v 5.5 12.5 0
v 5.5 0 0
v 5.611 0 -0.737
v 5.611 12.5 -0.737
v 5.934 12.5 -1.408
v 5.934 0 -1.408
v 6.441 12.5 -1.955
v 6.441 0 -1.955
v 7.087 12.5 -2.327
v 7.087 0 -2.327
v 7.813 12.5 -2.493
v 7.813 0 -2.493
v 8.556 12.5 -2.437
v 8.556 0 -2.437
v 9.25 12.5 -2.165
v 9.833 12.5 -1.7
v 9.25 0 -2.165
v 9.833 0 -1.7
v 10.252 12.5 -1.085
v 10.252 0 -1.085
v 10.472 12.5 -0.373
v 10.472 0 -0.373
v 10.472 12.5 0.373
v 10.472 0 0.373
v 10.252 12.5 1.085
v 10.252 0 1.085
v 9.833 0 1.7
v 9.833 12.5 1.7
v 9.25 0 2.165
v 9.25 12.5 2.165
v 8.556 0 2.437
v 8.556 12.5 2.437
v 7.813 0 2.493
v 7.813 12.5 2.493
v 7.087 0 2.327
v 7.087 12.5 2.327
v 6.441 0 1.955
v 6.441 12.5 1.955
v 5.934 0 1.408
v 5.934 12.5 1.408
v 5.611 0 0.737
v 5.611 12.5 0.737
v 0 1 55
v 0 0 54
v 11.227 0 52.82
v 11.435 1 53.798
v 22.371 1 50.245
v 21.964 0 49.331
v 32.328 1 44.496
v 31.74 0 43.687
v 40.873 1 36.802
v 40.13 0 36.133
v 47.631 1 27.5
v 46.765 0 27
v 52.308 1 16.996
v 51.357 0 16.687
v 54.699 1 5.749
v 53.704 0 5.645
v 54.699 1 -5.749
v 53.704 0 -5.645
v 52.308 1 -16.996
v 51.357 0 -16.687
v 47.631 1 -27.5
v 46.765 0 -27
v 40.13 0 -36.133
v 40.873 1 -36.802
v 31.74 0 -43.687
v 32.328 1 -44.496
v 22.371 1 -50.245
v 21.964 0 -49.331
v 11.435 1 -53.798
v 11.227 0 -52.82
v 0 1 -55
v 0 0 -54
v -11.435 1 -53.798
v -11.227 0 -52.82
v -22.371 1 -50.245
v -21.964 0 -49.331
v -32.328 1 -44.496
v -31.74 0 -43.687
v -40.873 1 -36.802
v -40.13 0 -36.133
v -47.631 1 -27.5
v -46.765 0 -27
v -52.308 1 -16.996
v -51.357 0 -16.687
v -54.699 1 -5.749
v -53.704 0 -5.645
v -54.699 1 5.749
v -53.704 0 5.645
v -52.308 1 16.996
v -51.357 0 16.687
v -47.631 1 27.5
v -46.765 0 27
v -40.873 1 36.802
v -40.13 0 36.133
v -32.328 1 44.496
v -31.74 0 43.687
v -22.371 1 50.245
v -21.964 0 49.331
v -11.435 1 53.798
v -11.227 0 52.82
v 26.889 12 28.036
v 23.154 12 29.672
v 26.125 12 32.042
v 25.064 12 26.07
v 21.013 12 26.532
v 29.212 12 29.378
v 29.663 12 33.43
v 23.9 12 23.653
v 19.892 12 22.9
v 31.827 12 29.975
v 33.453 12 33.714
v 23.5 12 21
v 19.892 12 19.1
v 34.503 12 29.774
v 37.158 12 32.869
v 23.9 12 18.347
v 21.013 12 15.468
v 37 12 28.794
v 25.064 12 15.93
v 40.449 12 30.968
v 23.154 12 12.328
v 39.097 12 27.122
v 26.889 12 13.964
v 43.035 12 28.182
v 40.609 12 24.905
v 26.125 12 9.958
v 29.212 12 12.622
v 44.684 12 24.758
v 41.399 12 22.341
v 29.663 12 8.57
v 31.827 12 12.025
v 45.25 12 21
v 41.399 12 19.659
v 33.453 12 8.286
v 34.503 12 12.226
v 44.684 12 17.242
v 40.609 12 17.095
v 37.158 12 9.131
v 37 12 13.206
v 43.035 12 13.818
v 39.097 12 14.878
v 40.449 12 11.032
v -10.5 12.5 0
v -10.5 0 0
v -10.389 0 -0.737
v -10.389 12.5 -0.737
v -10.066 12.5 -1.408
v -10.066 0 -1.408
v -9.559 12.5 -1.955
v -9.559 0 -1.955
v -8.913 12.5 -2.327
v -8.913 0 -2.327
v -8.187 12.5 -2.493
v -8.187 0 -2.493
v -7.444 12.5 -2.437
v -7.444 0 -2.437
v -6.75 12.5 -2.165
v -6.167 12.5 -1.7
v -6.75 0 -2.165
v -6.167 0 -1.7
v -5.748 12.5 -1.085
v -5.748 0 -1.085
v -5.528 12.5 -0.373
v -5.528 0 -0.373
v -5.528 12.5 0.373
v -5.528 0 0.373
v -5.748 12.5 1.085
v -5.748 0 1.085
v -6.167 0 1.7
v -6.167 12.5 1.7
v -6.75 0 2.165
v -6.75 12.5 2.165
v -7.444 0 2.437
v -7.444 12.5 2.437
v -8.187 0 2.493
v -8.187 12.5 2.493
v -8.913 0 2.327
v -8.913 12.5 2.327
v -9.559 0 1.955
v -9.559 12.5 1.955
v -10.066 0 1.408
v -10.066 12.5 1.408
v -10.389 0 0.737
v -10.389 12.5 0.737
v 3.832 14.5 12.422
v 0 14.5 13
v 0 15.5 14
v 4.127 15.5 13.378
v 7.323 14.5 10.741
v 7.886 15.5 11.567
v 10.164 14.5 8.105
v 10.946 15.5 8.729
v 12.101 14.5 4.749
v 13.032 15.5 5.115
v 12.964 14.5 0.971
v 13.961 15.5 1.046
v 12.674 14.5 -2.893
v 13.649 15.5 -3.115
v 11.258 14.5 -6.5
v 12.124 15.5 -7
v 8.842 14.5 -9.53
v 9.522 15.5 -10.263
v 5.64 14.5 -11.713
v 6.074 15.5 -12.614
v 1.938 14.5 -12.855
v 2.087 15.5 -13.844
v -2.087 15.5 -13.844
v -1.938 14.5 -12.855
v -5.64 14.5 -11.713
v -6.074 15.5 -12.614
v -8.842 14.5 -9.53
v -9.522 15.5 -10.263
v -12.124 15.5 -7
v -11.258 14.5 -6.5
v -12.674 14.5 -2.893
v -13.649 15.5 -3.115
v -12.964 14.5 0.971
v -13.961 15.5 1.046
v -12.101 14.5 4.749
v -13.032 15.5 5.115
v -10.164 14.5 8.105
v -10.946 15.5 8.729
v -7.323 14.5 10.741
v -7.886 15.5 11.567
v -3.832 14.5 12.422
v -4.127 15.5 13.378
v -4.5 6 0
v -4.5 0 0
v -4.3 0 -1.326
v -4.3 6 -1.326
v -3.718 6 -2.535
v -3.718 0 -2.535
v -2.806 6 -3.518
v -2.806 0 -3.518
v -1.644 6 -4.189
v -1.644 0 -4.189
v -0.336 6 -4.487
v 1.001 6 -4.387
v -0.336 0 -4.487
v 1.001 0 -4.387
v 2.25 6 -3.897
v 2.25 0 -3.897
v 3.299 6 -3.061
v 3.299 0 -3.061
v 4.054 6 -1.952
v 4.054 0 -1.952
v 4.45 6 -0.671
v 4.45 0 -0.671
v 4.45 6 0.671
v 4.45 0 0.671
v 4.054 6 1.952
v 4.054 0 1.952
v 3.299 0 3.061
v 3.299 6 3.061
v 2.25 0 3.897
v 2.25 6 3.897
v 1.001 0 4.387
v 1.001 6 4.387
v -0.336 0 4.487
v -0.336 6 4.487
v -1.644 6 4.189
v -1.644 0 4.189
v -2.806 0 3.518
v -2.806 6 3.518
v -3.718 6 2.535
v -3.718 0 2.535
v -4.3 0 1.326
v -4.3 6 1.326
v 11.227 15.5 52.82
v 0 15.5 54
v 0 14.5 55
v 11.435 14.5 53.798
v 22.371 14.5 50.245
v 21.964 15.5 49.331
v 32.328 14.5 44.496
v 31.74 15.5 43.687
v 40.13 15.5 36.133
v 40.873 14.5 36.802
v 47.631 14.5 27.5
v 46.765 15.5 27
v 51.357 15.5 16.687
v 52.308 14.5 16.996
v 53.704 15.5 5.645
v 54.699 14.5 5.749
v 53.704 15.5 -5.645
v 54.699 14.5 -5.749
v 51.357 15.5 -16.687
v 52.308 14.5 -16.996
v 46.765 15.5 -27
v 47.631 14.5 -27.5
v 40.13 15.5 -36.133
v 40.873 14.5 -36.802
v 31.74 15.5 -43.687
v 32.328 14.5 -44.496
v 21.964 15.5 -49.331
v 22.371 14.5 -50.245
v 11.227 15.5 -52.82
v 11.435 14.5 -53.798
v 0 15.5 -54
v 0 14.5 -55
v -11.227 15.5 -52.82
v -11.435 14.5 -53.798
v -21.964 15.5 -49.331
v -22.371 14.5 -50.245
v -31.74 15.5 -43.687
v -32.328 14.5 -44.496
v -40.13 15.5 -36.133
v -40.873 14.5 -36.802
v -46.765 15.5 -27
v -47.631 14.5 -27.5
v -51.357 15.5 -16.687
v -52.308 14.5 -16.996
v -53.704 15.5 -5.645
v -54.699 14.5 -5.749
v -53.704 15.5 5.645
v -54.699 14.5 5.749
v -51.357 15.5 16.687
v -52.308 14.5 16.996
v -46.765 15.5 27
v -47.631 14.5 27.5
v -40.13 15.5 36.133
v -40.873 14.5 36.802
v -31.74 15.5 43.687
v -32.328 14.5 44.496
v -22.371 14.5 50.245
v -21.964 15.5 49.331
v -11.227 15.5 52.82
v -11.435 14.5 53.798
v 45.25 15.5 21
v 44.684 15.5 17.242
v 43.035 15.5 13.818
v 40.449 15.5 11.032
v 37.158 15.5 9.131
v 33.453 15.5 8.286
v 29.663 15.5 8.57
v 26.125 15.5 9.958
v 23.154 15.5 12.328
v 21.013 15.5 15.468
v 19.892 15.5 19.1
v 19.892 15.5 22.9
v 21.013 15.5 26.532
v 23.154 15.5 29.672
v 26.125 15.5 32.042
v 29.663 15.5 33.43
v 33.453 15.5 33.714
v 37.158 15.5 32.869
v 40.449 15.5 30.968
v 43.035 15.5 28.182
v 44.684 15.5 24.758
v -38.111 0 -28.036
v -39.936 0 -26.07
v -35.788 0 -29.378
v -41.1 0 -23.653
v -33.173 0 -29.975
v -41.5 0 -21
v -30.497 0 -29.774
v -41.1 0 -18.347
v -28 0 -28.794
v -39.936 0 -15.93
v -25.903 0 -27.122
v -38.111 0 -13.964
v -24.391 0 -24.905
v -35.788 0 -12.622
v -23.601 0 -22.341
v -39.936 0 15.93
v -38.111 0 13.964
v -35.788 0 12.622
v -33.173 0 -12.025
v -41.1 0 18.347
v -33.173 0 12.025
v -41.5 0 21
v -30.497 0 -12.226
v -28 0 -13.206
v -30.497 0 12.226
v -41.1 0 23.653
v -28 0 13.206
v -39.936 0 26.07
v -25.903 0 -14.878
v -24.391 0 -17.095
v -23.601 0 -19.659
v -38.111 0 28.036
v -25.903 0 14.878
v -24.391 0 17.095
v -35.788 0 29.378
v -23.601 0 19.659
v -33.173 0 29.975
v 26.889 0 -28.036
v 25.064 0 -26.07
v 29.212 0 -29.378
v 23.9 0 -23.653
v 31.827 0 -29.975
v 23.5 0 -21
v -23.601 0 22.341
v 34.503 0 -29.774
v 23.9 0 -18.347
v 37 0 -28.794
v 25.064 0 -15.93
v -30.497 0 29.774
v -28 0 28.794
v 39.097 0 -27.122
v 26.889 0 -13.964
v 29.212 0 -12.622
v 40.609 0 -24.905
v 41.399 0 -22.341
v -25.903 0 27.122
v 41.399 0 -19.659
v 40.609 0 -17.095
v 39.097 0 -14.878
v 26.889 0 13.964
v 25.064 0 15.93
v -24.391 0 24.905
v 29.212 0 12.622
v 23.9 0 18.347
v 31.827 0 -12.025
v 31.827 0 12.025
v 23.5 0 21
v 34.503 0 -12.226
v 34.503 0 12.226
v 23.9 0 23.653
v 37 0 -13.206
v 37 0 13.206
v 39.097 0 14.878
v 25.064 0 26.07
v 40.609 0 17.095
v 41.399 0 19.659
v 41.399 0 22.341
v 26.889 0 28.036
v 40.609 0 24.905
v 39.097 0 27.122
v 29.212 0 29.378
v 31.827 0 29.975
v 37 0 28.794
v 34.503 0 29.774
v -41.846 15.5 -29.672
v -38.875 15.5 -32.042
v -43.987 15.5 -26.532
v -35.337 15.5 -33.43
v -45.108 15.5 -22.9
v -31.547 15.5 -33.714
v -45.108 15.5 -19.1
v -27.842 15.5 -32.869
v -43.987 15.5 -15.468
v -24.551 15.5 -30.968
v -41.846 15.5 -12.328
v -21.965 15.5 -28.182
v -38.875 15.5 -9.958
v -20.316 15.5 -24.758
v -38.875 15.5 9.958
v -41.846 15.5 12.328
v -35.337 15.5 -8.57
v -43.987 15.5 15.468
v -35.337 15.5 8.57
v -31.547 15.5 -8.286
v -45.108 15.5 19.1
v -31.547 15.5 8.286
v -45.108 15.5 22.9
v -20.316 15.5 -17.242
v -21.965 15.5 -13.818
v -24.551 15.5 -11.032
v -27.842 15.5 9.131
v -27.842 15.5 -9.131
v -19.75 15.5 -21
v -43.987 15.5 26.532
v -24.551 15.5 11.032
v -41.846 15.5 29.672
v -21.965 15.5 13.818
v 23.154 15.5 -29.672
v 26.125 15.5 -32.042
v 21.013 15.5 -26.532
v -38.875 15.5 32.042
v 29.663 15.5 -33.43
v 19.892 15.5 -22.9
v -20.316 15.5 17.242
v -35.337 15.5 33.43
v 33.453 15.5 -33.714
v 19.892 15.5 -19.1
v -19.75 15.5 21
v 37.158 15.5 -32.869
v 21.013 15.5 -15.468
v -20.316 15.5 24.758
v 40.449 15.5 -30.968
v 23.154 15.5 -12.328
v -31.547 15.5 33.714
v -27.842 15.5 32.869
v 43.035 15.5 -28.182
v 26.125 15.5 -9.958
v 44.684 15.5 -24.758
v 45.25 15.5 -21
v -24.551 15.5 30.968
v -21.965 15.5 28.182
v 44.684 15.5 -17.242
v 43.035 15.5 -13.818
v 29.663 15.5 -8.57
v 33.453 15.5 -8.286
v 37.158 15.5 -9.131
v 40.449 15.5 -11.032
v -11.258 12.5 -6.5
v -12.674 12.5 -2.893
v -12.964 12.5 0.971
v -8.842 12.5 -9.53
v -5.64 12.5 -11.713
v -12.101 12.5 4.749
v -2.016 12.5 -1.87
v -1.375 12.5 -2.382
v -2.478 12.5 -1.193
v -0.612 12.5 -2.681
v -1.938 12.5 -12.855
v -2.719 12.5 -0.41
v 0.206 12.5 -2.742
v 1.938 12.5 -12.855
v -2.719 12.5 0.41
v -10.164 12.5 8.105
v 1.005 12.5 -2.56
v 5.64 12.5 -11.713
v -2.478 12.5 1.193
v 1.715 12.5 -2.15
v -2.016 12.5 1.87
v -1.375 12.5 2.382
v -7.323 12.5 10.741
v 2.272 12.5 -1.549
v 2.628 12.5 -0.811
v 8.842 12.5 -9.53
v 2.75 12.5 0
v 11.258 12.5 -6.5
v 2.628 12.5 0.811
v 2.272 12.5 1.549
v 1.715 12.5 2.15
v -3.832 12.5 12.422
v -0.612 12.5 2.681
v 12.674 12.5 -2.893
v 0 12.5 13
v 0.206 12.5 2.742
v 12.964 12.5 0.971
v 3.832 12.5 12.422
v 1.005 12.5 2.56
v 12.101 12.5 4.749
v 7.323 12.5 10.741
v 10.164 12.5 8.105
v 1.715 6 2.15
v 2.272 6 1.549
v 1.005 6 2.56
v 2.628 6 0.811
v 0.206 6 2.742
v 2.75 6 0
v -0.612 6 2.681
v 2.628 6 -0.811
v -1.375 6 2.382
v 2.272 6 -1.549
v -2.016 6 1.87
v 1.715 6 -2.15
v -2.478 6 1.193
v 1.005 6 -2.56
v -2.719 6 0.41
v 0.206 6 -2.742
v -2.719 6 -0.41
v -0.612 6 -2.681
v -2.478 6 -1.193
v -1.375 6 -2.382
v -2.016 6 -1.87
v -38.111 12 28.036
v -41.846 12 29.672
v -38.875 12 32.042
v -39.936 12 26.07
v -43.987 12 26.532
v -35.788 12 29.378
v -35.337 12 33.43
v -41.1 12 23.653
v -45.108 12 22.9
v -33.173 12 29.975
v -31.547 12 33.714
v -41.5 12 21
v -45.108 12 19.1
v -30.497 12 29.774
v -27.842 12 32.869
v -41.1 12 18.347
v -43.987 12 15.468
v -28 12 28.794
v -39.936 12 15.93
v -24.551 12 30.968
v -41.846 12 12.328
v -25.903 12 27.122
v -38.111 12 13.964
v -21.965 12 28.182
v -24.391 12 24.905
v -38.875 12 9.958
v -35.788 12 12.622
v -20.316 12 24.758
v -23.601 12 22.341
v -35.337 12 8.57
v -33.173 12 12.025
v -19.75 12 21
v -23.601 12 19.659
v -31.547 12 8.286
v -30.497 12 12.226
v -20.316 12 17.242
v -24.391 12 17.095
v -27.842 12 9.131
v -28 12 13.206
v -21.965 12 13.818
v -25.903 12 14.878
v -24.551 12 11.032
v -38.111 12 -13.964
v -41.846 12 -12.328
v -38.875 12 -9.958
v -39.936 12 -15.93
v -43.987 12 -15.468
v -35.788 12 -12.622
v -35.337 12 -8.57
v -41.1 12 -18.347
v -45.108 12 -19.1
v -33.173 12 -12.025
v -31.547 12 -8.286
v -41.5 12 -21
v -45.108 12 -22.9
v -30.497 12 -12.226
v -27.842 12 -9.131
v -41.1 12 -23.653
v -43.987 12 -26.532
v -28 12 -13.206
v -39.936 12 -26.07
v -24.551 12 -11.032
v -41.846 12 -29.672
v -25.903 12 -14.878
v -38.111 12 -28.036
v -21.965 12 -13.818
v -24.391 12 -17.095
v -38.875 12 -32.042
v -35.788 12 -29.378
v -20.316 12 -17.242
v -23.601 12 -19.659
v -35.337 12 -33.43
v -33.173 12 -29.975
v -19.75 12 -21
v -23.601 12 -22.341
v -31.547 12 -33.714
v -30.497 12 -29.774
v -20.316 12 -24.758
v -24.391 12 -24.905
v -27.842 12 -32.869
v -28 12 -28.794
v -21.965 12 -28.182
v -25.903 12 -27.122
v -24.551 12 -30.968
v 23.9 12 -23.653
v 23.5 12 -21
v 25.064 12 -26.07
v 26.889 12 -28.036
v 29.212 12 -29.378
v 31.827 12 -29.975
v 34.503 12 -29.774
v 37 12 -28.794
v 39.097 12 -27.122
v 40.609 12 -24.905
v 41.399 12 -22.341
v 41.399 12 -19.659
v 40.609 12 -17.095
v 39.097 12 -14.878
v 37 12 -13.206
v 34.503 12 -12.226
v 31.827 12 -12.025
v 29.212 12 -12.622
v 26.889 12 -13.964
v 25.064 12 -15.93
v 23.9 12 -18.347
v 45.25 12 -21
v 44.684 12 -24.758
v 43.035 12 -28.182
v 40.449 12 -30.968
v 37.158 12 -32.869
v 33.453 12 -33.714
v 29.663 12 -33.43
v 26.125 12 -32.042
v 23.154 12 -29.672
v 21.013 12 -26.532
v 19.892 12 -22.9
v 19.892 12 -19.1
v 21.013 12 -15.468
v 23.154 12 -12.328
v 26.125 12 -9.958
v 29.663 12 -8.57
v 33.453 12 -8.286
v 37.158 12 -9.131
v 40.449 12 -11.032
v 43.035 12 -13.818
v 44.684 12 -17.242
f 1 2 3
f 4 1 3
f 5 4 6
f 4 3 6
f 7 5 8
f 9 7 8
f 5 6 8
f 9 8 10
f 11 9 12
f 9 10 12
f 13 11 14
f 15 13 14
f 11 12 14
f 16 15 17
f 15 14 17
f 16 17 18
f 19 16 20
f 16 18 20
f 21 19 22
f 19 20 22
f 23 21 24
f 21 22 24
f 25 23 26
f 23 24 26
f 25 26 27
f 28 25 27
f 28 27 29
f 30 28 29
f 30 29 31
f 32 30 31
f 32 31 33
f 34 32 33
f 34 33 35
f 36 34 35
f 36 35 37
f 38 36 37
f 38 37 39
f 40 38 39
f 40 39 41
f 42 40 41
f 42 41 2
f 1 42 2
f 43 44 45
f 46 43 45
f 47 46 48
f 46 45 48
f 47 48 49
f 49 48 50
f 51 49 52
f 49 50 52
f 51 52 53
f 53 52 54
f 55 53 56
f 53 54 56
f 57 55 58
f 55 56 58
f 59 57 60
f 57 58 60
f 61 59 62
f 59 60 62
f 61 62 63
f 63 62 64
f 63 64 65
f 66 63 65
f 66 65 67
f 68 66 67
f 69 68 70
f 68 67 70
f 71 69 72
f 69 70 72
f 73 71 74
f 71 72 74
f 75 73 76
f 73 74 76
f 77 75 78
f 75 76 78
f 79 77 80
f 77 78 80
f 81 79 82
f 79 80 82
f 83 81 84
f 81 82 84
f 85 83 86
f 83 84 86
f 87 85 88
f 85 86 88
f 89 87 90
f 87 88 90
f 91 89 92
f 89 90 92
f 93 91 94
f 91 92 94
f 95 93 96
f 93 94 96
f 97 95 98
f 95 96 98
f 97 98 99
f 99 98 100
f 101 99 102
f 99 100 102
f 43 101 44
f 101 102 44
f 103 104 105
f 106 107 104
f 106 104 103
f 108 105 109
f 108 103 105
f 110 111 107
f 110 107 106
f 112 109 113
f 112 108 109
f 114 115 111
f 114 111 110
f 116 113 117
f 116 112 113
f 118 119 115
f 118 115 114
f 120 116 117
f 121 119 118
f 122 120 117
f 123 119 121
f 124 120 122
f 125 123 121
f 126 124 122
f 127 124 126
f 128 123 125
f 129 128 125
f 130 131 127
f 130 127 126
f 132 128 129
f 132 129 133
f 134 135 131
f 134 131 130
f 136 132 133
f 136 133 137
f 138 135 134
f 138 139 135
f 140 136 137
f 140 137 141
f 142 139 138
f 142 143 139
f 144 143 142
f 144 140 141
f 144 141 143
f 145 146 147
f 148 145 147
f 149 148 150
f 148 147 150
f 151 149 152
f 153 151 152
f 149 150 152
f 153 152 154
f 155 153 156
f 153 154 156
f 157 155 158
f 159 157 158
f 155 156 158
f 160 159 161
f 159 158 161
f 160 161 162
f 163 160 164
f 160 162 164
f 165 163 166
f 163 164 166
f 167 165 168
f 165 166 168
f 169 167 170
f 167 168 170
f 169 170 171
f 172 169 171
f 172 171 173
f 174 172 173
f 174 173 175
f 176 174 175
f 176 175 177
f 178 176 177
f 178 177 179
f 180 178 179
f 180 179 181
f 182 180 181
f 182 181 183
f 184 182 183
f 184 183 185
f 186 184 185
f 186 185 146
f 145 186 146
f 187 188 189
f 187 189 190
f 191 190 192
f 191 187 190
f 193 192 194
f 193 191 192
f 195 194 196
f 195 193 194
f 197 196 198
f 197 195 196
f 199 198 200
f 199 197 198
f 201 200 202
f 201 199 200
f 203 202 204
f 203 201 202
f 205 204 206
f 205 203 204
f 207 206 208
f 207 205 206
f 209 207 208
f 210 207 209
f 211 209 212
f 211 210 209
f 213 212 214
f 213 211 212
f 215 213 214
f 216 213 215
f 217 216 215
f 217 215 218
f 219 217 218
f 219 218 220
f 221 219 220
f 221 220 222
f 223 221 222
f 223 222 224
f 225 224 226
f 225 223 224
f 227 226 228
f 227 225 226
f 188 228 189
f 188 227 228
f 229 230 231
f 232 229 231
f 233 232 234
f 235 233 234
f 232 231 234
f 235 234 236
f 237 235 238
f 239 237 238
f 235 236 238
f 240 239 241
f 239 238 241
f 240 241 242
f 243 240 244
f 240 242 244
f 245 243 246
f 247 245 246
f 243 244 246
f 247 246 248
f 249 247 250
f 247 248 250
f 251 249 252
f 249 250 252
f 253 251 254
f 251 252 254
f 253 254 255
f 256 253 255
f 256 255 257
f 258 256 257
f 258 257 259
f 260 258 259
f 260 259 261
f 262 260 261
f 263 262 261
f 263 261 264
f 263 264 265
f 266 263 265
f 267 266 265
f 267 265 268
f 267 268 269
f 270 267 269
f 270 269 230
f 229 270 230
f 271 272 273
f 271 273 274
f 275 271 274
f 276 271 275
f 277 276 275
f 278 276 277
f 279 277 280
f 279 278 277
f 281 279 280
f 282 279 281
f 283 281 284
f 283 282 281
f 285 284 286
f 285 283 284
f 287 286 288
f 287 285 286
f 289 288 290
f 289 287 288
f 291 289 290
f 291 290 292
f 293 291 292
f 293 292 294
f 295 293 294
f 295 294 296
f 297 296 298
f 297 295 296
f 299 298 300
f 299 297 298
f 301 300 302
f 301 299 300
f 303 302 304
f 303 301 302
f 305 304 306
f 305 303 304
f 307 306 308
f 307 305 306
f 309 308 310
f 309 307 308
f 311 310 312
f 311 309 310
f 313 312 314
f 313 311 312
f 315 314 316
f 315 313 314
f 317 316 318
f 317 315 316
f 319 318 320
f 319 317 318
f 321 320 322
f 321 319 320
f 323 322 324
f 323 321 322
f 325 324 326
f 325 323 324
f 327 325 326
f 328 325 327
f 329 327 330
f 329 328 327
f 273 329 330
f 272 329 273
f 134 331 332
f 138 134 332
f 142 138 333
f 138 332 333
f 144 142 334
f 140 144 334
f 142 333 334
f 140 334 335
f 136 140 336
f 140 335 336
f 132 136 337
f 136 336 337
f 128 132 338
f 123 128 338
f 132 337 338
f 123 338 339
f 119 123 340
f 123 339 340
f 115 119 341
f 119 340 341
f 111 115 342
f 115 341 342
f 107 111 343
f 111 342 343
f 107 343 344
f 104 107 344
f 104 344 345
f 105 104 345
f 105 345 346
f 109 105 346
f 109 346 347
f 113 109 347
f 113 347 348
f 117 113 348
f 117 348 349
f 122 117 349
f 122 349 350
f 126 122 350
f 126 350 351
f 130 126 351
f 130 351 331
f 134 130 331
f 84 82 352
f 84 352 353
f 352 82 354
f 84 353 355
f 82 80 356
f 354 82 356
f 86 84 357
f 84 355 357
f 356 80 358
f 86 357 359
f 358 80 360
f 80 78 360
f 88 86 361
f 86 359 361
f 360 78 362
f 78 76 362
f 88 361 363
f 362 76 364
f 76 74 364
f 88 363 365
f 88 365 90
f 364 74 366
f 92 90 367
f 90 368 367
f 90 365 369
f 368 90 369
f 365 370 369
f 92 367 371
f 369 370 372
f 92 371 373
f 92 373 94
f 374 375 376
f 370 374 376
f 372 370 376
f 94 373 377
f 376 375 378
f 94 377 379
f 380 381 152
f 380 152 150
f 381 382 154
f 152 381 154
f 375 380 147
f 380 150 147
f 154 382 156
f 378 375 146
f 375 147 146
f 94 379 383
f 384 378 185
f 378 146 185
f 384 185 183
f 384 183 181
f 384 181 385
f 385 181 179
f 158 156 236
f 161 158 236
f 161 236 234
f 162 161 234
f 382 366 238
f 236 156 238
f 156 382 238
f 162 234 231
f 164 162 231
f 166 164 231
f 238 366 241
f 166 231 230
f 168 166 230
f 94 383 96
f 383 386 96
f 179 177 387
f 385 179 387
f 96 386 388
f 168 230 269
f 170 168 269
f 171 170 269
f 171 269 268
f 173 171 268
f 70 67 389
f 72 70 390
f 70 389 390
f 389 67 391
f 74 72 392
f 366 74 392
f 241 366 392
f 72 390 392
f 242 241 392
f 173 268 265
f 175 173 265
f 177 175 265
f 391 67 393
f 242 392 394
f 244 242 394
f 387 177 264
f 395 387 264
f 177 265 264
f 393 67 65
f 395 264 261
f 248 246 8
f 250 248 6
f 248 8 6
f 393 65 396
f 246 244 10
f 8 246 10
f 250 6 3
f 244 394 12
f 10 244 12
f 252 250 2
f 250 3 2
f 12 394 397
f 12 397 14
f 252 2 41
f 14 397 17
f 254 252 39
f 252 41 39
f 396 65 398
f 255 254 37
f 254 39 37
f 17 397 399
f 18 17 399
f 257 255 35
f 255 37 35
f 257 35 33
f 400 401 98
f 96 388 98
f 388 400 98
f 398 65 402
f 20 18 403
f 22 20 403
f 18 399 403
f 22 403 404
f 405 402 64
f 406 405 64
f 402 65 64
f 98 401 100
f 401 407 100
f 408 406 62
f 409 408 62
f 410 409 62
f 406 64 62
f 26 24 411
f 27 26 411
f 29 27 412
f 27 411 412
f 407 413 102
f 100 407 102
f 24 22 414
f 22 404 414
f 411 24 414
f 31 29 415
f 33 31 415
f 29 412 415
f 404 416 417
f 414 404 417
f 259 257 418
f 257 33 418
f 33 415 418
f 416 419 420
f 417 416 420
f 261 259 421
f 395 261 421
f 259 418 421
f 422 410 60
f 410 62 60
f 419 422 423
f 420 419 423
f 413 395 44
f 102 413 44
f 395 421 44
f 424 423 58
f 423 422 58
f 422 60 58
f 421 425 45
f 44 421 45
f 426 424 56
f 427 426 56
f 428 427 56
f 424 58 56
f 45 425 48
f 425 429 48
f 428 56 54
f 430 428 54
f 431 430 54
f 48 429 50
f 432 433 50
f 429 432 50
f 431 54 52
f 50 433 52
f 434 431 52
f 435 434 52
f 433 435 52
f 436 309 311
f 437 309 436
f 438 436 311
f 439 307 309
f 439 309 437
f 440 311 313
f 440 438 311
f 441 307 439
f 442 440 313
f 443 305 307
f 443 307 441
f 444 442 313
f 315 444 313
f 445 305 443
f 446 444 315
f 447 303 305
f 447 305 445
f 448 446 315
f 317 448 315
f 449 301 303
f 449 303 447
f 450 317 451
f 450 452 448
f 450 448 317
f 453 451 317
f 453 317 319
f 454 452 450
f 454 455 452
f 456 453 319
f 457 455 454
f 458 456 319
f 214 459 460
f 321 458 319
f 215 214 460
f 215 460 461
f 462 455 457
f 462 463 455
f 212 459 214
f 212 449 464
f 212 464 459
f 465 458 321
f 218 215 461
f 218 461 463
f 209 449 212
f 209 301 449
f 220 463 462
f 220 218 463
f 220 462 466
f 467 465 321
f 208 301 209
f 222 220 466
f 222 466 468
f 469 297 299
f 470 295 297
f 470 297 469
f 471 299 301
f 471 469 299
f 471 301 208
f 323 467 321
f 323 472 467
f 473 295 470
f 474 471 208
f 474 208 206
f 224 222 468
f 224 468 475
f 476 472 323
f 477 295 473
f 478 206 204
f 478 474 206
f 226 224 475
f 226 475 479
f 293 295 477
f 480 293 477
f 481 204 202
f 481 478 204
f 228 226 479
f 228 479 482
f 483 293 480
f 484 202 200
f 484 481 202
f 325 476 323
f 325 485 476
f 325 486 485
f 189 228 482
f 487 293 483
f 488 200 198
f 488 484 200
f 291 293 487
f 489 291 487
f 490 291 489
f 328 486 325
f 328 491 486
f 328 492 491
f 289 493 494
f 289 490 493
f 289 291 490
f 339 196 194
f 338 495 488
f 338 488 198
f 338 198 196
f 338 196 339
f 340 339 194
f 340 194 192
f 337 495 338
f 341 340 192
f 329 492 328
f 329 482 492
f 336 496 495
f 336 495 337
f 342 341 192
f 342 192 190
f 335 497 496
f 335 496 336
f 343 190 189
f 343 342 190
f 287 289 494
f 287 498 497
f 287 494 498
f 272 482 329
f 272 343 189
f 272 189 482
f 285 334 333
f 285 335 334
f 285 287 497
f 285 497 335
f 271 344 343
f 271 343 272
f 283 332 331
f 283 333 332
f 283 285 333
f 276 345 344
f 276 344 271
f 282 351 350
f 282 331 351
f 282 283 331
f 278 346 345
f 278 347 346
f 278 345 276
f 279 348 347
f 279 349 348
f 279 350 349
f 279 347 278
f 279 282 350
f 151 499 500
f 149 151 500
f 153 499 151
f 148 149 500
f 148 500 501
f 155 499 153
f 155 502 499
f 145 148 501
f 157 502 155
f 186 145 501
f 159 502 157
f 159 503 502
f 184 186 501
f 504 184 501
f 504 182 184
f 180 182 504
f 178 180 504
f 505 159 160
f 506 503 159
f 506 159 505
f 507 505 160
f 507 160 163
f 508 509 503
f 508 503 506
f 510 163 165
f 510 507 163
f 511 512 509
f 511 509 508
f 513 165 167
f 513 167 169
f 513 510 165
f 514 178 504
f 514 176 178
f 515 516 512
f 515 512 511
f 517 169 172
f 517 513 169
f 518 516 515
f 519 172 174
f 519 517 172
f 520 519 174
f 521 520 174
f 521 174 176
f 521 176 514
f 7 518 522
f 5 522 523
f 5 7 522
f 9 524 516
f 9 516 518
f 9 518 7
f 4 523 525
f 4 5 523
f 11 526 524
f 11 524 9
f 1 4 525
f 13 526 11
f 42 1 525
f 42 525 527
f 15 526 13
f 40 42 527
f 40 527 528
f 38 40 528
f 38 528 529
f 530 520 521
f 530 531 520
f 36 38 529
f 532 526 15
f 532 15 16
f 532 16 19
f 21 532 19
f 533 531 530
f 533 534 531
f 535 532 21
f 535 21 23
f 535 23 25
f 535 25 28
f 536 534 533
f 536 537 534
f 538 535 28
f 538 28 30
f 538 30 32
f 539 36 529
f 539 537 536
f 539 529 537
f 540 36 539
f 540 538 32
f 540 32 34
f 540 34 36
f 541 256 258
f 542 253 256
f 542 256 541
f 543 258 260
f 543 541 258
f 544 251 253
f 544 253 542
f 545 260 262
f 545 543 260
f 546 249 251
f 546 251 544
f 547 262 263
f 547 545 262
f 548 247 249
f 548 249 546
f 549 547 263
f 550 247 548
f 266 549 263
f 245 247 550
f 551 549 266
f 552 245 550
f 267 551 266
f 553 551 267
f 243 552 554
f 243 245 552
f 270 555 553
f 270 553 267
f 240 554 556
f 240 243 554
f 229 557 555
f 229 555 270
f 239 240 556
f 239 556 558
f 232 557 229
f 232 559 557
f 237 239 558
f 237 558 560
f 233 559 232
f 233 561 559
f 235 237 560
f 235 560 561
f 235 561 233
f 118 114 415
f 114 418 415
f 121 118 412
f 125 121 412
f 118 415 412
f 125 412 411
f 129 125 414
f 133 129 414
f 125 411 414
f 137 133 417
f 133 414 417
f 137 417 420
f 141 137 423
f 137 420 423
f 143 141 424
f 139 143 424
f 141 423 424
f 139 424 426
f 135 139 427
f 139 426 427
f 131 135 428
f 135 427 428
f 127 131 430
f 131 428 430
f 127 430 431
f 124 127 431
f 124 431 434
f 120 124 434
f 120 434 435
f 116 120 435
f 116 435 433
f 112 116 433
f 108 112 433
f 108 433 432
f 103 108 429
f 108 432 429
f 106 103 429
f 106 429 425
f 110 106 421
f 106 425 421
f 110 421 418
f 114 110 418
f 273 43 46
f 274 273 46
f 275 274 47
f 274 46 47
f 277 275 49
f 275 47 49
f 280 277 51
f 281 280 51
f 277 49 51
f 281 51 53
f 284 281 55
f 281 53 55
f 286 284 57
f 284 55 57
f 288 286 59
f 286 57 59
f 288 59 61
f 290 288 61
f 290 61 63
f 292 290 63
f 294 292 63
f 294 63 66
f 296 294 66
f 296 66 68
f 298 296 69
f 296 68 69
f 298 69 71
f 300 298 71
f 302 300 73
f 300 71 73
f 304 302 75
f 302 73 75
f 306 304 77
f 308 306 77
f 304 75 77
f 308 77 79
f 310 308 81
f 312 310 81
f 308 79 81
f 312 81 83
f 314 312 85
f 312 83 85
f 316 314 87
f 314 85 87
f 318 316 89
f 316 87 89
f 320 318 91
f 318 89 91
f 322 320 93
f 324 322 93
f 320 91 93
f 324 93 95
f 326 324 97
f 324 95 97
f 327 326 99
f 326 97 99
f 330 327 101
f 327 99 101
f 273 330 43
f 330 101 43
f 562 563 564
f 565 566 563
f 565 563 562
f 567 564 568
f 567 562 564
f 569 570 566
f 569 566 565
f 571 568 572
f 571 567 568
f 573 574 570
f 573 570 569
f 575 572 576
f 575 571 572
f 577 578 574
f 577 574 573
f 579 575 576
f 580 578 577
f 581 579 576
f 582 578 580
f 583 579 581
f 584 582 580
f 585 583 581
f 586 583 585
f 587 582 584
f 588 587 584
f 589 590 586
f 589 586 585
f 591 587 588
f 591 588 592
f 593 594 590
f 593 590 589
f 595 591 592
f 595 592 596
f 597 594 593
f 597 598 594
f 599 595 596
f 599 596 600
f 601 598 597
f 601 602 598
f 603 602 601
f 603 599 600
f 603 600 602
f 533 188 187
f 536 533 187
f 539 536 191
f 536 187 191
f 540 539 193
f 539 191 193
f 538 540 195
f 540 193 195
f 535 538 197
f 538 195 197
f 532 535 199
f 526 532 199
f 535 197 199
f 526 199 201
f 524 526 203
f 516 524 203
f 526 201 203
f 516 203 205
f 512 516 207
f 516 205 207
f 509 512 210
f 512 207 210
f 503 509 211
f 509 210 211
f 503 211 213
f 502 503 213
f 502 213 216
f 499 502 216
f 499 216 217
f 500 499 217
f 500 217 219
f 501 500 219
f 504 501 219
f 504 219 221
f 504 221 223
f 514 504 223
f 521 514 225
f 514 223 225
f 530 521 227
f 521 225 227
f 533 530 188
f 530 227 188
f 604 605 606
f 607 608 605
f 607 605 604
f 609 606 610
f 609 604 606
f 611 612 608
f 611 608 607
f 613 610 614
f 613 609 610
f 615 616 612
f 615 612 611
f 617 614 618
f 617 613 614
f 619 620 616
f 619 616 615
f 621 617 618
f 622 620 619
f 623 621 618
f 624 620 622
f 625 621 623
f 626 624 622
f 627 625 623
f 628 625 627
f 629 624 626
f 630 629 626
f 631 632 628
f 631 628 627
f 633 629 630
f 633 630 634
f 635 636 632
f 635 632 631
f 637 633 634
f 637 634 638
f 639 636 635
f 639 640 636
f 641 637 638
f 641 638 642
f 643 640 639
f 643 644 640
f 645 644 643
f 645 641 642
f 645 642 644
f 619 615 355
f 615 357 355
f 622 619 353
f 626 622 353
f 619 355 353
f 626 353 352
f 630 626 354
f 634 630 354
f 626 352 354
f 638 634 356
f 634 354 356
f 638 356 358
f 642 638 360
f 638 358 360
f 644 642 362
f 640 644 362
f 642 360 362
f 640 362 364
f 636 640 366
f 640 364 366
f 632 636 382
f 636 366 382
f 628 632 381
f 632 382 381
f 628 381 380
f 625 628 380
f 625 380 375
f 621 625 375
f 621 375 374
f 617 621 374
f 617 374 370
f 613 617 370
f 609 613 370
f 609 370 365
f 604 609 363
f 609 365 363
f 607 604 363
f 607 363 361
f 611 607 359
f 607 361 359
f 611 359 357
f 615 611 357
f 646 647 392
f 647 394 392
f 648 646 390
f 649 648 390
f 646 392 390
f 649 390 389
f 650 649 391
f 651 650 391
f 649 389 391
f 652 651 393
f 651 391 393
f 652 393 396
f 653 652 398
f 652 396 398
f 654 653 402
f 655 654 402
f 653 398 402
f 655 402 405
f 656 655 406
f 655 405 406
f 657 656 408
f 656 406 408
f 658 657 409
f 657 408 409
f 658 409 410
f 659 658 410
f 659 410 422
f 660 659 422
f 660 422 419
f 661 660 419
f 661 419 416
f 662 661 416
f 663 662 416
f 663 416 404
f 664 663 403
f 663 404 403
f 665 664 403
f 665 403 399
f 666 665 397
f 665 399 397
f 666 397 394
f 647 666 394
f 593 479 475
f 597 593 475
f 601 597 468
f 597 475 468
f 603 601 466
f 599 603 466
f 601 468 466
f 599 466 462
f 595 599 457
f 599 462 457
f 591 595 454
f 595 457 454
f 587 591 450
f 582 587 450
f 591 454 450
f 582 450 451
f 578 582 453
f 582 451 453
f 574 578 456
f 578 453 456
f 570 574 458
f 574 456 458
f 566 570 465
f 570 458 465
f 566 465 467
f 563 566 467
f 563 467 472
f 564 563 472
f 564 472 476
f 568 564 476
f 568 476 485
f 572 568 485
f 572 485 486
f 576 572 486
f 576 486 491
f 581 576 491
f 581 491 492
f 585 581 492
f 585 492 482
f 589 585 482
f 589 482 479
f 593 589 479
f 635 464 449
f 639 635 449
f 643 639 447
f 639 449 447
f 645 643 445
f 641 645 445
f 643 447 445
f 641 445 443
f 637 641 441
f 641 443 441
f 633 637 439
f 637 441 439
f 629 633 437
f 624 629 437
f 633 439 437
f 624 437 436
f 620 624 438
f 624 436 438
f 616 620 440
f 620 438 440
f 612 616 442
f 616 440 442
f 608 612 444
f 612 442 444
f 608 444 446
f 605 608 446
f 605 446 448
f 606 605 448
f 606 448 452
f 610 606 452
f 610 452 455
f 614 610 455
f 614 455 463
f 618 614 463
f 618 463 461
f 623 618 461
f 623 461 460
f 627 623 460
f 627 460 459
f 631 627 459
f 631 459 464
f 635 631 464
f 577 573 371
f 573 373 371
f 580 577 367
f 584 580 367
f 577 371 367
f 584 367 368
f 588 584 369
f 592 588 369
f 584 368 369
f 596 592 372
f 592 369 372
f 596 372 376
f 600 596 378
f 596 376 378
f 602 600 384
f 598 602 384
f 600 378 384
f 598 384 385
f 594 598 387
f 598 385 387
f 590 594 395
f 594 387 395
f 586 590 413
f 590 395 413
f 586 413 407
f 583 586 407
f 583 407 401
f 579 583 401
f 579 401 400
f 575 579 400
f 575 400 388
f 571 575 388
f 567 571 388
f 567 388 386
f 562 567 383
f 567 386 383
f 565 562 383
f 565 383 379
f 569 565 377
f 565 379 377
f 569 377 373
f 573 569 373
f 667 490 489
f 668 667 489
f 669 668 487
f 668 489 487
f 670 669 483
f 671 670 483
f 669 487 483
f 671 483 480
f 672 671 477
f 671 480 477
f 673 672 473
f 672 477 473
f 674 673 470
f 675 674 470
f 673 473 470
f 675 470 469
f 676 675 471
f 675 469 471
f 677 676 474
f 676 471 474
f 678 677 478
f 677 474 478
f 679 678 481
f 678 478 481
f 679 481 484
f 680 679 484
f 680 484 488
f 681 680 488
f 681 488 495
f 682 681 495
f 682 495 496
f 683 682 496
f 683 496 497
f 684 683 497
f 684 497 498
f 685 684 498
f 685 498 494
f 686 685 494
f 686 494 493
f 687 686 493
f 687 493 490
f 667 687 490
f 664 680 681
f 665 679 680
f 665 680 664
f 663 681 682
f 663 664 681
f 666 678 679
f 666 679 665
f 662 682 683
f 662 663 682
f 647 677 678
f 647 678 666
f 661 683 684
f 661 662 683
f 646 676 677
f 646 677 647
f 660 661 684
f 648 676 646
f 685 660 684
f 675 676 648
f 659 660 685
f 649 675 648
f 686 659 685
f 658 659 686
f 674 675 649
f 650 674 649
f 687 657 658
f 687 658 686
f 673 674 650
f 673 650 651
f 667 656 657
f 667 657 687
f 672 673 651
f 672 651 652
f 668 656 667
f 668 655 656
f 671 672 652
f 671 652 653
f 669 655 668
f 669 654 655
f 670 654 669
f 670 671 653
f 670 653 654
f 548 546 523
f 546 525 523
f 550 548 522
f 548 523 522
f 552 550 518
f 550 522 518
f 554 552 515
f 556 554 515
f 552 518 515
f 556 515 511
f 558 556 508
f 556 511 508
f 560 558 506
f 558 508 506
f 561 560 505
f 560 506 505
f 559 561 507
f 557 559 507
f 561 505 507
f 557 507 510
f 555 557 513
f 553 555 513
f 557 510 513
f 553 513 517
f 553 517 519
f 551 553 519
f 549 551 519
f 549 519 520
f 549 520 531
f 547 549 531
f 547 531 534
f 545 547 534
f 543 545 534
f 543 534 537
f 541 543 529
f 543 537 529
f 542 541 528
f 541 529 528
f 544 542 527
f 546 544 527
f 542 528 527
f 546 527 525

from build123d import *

# Parameters (mm, degrees)
SKETCH1_R                                           = 55
BOSS_EXTRUDE1_DEPTH                                 = 15.5
CBORE_FOR_M6_HEX_SOCKET_HEAD_CAP_SCREW1_D           = 18
CBORE_FOR_M6_HEX_SOCKET_HEAD_CAP_SCREW1_CBORE_D     = 25.5
CBORE_FOR_M6_HEX_SOCKET_HEAD_CAP_SCREW1_CBORE_DEPTH = 3.5
SKETCH5_R                                           = 13
CUT_EXTRUDE1_DEPTH                                  = 3
F_5_0MM_DOWEL_HOLE1_D                               = 5
CHAMFER1_SIZE                                       = 1
CHAMFER2_SIZE                                       = 1
CBORE_FOR_M5_HEX_SOCKET_HEAD_CAP_SCREW1_D           = 5.5
CBORE_FOR_M5_HEX_SOCKET_HEAD_CAP_SCREW1_CBORE_D     = 9
CBORE_FOR_M5_HEX_SOCKET_HEAD_CAP_SCREW1_CBORE_DEPTH = 6


with BuildPart() as part:
    # Sketch1 → Boss-Extrude1 (new body)
    with BuildSketch(Plane(origin=(0, 0, 0), x_dir=(1, 0, 0), z_dir=(0, 1, 0))):
        with Locations(Location((0, 0, 0), (0, 0, 270))):
            Circle(SKETCH1_R)
    extrude(amount=BOSS_EXTRUDE1_DEPTH)

    # CBORE for M6 Hex Socket Head Cap Screw1 (through all)
    with Locations(Plane(origin=(0, 15.5, 0), x_dir=(1, 0, 0), z_dir=(0, 1, 0))):
        with Locations((-32.5, 21), (32.5, 21), (32.5, -21), (-32.5, -21)):
            CounterBoreHole(CBORE_FOR_M6_HEX_SOCKET_HEAD_CAP_SCREW1_D / 2, CBORE_FOR_M6_HEX_SOCKET_HEAD_CAP_SCREW1_CBORE_D / 2, CBORE_FOR_M6_HEX_SOCKET_HEAD_CAP_SCREW1_CBORE_DEPTH)

    # Sketch5 → Cut-Extrude1 (cut)
    with BuildSketch(Plane(origin=(0, 15.5, 0), x_dir=(1, 0, 0), z_dir=(0, 1, 0))):
        with Locations(Location((0, 0, 0), (0, 0, 270))):
            Circle(SKETCH5_R)
    extrude(amount=-CUT_EXTRUDE1_DEPTH, mode=Mode.SUBTRACT)

    # Ø5.0mm Dowel Hole1 (through all)
    with Locations(Plane(origin=(0, 12.5, 0), x_dir=(1, 0, 0), z_dir=(0, 1, 0))):
        with Locations((-8, 0), (8, 0)):
            Hole(F_5_0MM_DOWEL_HOLE1_D / 2)

    # Chamfer1
    chamfer1_edges = [part.edges().sort_by_distance(p)[0] for p in [
        (0, 15.5, -13),
        (0, 15.5, -55),
    ]]
    chamfer(chamfer1_edges, length=CHAMFER1_SIZE)

    # Chamfer2
    chamfer2_edges = [part.edges().sort_by_distance(p)[0] for p in [
        (0, 0, -55),
    ]]
    chamfer(chamfer2_edges, length=CHAMFER2_SIZE)

    # CBORE for M5 Hex Socket Head Cap Screw1 (through all)
    with Locations(Plane(origin=(0, 0, 0), x_dir=(-1, 0, 0), z_dir=(0, -1, 0))):
        with Locations((0, 0)):
            CounterBoreHole(CBORE_FOR_M5_HEX_SOCKET_HEAD_CAP_SCREW1_D / 2, CBORE_FOR_M5_HEX_SOCKET_HEAD_CAP_SCREW1_CBORE_D / 2, CBORE_FOR_M5_HEX_SOCKET_HEAD_CAP_SCREW1_CBORE_DEPTH)


solid = part.part
